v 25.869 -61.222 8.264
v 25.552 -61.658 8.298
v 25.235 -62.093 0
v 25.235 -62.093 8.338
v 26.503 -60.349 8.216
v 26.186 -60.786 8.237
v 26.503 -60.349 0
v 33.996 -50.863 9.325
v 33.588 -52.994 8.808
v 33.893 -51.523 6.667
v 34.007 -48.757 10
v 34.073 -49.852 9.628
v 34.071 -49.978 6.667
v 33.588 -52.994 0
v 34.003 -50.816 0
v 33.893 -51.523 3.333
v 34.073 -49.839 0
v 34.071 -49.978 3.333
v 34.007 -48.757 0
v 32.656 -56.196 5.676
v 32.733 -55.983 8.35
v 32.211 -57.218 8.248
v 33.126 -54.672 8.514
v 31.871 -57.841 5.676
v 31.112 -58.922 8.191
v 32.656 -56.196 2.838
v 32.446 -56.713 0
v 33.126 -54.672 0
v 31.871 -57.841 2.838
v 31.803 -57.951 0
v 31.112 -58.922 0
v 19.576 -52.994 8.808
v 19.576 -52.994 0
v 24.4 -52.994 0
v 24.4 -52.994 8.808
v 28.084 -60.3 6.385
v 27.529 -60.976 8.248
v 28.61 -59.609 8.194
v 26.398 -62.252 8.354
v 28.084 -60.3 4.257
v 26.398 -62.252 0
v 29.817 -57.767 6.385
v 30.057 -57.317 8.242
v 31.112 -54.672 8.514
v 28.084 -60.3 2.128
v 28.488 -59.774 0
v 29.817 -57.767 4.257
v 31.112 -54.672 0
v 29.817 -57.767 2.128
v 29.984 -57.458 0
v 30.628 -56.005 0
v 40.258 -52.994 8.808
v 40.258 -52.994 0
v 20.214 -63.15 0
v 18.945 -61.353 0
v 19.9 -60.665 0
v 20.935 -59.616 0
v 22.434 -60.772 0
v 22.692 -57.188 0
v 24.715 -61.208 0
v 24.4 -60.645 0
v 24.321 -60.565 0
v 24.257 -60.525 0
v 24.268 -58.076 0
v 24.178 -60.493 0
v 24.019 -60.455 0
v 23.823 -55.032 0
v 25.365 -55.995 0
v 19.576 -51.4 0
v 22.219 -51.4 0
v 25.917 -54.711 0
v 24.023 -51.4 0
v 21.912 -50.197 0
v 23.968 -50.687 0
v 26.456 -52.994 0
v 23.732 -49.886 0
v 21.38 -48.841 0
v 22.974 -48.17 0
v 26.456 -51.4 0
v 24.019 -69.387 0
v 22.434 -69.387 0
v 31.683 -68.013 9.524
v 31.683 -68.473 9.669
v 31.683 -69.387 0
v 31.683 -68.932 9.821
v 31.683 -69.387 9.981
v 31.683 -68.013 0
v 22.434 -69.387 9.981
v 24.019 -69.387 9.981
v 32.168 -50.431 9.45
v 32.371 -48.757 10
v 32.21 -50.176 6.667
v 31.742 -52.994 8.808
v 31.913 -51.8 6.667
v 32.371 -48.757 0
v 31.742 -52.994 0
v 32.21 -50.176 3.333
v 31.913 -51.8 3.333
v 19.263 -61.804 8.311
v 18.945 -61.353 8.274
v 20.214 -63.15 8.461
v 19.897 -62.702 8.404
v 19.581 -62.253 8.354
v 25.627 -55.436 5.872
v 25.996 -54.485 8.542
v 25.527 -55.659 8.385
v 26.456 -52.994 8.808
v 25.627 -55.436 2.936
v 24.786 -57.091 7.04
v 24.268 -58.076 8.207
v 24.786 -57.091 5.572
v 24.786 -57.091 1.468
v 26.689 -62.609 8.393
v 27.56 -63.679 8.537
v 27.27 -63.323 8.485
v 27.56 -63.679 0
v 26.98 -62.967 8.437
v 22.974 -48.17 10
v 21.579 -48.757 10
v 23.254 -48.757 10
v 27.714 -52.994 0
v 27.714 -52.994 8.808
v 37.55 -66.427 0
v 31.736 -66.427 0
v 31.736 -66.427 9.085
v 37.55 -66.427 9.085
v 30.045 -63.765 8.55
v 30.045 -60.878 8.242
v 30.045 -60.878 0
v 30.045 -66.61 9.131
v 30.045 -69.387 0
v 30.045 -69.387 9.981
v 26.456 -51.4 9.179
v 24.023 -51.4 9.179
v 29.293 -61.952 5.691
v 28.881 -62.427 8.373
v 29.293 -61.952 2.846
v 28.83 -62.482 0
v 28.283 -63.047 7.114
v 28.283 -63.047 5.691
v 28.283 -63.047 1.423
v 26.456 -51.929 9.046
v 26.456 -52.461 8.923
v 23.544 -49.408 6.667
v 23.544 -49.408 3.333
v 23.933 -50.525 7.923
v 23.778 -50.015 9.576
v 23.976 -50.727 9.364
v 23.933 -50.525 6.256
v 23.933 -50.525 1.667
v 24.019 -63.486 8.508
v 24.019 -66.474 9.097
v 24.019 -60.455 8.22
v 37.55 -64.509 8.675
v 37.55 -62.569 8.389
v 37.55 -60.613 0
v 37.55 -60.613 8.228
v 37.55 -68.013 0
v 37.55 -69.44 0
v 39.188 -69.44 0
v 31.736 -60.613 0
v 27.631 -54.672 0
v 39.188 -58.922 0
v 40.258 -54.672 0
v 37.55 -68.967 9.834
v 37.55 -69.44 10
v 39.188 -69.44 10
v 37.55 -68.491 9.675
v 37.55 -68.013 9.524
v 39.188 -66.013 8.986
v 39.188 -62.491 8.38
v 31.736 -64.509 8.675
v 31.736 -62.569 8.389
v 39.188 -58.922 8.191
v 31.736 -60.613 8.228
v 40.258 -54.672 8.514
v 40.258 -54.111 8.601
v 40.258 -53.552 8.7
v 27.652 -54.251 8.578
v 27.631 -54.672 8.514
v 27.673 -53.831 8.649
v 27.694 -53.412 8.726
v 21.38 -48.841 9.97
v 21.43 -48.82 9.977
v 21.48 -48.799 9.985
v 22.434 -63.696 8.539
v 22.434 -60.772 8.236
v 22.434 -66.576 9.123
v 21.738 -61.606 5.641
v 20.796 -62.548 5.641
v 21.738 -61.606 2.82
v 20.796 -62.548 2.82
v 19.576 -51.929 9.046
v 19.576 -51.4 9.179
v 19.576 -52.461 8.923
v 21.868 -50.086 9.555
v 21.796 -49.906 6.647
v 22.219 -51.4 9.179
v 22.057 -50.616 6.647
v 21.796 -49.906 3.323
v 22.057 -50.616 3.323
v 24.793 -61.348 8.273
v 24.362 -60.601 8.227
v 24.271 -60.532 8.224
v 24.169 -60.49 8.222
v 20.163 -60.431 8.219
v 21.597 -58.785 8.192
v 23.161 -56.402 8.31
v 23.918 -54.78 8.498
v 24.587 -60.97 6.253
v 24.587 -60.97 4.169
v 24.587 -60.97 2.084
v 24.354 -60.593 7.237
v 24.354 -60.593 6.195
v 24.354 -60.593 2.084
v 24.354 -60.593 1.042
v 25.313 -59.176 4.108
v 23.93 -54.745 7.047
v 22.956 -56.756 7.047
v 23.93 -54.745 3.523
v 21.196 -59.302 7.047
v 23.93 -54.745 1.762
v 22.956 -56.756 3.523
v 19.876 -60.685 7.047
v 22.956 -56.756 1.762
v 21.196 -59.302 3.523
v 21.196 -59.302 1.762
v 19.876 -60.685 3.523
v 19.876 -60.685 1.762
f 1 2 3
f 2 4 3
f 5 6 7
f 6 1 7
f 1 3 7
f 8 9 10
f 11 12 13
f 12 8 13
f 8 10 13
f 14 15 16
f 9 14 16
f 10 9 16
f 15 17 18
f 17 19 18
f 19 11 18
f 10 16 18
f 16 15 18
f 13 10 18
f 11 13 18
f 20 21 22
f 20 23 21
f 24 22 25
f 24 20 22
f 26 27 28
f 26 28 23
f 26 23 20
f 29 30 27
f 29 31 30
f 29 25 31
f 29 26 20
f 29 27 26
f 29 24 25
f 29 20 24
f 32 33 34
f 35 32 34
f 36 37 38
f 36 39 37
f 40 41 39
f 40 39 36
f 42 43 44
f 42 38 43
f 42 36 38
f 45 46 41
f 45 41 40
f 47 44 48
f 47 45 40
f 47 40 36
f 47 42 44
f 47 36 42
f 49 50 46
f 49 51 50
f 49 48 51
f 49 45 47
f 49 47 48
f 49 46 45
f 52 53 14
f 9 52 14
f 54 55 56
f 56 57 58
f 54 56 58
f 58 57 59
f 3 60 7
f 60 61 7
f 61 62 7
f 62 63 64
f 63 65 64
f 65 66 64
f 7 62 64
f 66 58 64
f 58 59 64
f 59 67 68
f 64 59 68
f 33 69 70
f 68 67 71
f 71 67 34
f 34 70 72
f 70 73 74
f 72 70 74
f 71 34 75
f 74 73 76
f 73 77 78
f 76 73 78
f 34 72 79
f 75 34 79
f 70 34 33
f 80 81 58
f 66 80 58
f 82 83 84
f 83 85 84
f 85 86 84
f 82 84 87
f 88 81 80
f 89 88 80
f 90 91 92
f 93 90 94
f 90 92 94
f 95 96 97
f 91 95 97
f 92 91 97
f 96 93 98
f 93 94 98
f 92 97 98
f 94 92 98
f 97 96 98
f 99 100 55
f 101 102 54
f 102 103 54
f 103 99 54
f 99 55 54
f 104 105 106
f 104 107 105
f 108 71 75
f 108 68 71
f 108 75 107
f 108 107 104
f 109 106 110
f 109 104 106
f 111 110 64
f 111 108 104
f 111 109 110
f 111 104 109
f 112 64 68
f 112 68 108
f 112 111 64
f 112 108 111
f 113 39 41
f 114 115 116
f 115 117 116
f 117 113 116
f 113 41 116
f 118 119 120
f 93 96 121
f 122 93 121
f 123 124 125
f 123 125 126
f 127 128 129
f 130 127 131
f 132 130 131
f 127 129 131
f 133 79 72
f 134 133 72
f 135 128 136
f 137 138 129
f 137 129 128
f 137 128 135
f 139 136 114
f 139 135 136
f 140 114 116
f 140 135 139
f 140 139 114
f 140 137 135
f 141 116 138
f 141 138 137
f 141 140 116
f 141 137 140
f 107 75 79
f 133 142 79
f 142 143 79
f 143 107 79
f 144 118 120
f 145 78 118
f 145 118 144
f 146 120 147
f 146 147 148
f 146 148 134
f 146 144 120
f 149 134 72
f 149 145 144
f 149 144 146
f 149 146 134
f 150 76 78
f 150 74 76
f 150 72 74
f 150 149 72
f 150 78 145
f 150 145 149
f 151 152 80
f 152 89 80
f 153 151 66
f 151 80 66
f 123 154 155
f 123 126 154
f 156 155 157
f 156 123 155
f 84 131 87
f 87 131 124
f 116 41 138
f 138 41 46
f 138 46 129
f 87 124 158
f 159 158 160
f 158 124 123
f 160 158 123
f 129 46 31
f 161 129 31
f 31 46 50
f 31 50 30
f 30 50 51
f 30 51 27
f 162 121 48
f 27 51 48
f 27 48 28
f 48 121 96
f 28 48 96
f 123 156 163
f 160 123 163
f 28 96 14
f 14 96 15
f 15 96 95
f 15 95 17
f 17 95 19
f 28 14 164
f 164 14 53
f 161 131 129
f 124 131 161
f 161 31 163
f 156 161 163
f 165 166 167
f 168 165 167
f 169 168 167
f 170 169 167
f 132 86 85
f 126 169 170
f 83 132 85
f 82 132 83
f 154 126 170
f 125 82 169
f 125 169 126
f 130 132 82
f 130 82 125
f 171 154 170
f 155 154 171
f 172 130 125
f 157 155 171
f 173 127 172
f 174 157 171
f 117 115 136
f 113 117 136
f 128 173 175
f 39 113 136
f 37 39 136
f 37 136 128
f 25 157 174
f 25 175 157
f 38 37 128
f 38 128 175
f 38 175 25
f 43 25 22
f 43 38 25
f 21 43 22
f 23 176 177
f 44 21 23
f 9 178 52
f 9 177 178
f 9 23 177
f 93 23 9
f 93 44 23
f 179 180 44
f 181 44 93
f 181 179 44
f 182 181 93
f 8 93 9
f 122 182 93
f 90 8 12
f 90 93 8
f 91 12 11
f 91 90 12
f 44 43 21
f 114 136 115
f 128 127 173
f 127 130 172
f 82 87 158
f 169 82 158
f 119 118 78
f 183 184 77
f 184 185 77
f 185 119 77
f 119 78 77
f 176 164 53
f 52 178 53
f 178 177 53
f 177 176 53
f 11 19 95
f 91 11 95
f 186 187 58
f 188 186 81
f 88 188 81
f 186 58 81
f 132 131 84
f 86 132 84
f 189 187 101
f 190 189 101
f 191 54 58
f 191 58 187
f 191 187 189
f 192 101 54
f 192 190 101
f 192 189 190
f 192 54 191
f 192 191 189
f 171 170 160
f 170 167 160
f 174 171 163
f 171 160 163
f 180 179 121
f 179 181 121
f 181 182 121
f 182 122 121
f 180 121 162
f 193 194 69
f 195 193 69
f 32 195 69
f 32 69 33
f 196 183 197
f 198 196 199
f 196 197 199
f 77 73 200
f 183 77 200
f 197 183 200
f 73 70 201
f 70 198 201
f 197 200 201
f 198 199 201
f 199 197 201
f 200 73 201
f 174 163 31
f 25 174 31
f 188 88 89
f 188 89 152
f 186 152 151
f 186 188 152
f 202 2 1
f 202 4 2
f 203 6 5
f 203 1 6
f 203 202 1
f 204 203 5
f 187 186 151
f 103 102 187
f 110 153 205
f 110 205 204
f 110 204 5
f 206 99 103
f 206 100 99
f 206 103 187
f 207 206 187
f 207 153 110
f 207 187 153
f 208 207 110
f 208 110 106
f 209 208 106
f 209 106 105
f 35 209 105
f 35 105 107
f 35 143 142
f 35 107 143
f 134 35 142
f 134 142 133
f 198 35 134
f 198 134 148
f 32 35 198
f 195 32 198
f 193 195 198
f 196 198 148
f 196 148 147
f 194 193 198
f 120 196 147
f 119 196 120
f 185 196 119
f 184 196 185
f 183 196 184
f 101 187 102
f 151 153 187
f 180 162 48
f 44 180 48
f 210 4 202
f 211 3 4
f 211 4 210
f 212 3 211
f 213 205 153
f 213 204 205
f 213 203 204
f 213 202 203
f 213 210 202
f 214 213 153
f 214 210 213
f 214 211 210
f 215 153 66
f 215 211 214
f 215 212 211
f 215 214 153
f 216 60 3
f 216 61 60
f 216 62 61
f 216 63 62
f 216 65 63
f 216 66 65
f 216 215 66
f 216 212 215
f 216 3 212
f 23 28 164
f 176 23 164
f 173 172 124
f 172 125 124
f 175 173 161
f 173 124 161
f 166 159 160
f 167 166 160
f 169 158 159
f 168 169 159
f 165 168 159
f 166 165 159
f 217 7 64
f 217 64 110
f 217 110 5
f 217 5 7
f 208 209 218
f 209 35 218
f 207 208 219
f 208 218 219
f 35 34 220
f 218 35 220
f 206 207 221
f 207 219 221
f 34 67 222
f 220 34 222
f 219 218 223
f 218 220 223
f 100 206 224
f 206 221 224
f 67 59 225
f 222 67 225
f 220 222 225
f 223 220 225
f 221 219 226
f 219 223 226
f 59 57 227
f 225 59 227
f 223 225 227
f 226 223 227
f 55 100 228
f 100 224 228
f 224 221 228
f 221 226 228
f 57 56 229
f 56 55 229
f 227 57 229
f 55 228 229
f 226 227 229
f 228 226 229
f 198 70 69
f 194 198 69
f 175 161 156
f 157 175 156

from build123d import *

# Parameters (mm, degrees)
F1_DEPTH = 10
F0_W     = 5.8139264584
F0_H     = 5.8139264584
F3_DEPTH = 200


with BuildPart() as f1:
    # F0 (on Top) → F1 (new body)
    with BuildSketch(Plane.XY):
        with BuildLine():
            Line((22.9741111398, -48.1698401272), (21.3800054044, -48.8410443068))
            add(Edge.make_bspline(
                [(21.3800054044, -48.8410443068), (21.524594907, -49.2160956774), (21.7868467024, -49.8963518062), (22.0824932893, -50.5990640789), (22.1730765622, -51.1305136503), (22.2190096974, -51.4000020921)],
                knots=[0, 0, 0, 0, 0.3772276795, 0.6842034479, 1, 1, 1, 1], degree=3))
            Line((22.2190096974, -51.4000020921), (19.5761490613, -51.4000020921))
            Line((19.5761490613, -51.4000020921), (19.5761490613, -52.9941096902))
            Line((19.5761490613, -52.9941096902), (24.4004167616, -52.9941096902))
            add(Edge.make_bspline(
                [(24.4004167616, -52.9941096902), (24.2679929093, -53.5784359754), (23.98854509, -54.8115122168), (23.0099309061, -56.7937003015), (21.2795782257, -59.3085357977), (19.9512093339, -60.6919749864), (19.2509091372, -61.1524687513), (18.9453065395, -61.3534227014)],
                knots=[0, 0, 0, 0, 0.1908898343, 0.4028258276, 0.6522225297, 0.8482340876, 1, 1, 1, 1], degree=3))
            Line((18.9453065395, -61.3534227014), (20.2137995511, -63.1504505873))
            add(Edge.make_bspline(
                [(22.4336609244, -60.7720278203), (22.2193825413, -61.0447629972), (21.7678373045, -61.6194932534), (20.7947152937, -62.5339951909), (20.391954321, -62.9613965451), (20.2137995511, -63.1504505873)],
                knots=[0, 0, 0, 0, 0.3349448552, 0.7058236663, 1, 1, 1, 1], degree=3))
            Line((22.4336609244, -60.7720278203), (22.4336609244, -69.3872123957))
            Line((22.4336609244, -69.3872123957), (24.0192785859, -69.3872123957))
            Line((24.0192785859, -69.3872123957), (24.0192785859, -60.4549050331))
            add(Edge.make_bspline(
                [(25.2349171788, -62.0933771133), (25.1299231341, -61.9186800346), (24.9155961542, -61.5620665009), (24.5873540863, -60.9917459152), (24.3736706942, -60.5270046564), (24.1299113219, -60.4774128102), (24.0192785859, -60.4549050331)],
                knots=[0, 0, 0, 0, 0.2744106756, 0.5601614031, 0.800374661, 1, 1, 1, 1], degree=3))
            Line((25.2349171788, -62.0933771133), (26.5034101903, -60.3491999209))
            add(Edge.make_bspline(
                [(24.2679929093, -58.0763779581), (24.6090541844, -58.4415971161), (25.3080659698, -59.1901209573), (26.098595302, -59.9566666127), (26.5034101903, -60.3491999209)],
                knots=[0, 0, 0, 0, 0.4879192056, 1, 1, 1, 1], degree=3))
            add(Edge.make_bspline(
                [(26.4559742063, -52.9941096902), (26.2204164278, -53.8074575651), (25.7642118272, -55.3826678796), (24.6031830474, -57.3946817788), (24.3564340323, -57.8965099703), (24.2679929093, -58.0763779581)],
                knots=[0, 0, 0, 0, 0.4065039358, 0.7872759152, 1, 1, 1, 1], degree=3))
            Line((26.4559742063, -52.9941096902), (26.4559742063, -51.4000020921))
            Line((26.4559742063, -51.4000020921), (24.0228660405, -51.4000020921))
            add(Edge.make_bspline(
                [(22.9741111398, -48.1698401272), (23.1677160931, -48.5713815167), (23.5530605276, -49.370595261), (24.0182670501, -50.6466479678), (24.0214963958, -51.1756425361), (24.0228660405, -51.4000020921)],
                knots=[0, 0, 0, 0, 0.367680231, 0.731817695, 1, 1, 1, 1], degree=3))
        make_face()
    extrude(amount=F1_DEPTH)


with BuildPart() as f1b:
    # F0 (on Top) → F1, piece 2 (new body)
    with BuildSketch(Plane.XY):
        with BuildLine():
            Line((31.7416936159, -52.9941096902), (27.7144797146, -52.9941096902))
            Line((27.7144797146, -52.9941096902), (27.6305787265, -54.6721145511))
            Line((27.6305787265, -54.6721145511), (31.1124417931, -54.6721145511))
            add(Edge.make_bspline(
                [(26.3977032155, -62.2519366443), (26.9529510611, -61.6398399962), (28.113947147, -60.3599758448), (29.8765229764, -57.8402958637), (30.6154790091, -56.0805293685), (30.9545730444, -55.119521665), (31.1124417931, -54.6721145511)],
                knots=[0, 0, 0, 0, 0.2702142518, 0.5650047833, 0.7974834606, 1, 1, 1, 1], degree=3))
            Line((26.3977032155, -62.2519366443), (27.5604873896, -63.6789947748))
            add(Edge.make_bspline(
                [(30.0446208566, -60.8777366579), (29.8282077293, -61.218473349), (29.358386486, -61.9581943529), (28.093755143, -63.2617112834), (27.706139733, -63.5650214134), (27.5604873896, -63.6789947748)],
                knots=[0, 0, 0, 0, 0.3477281045, 0.7548989859, 1, 1, 1, 1], degree=3))
            Line((30.0446208566, -60.8777366579), (30.0446208566, -69.3872123957))
            Line((30.0446208566, -69.3872123957), (31.6830910742, -69.3872123957))
            Line((31.6830910742, -69.3872123957), (31.6830910742, -68.0130124092))
            Line((31.6830910742, -68.0130124092), (37.5498719513, -68.0130124092))
            Line((37.5498719513, -68.0130124092), (37.5498719513, -69.4400668144))
            Line((37.5498719513, -69.4400668144), (39.1883403063, -69.4400668144))
            Line((39.1883403063, -69.4400668144), (39.1883403063, -58.9221417904))
            Line((39.1883403063, -58.9221417904), (31.1124417931, -58.9221417904))
            add(Edge.make_bspline(
                [(33.1260487437, -54.6721145511), (32.9899684164, -55.1707391663), (32.7084407151, -56.2023110654), (31.9228094689, -57.8621087911), (31.3677229258, -58.5882113624), (31.1124417931, -58.9221417904)],
                knots=[0, 0, 0, 0, 0.3356903153, 0.6944877678, 1, 1, 1, 1], degree=3))
            Line((33.1260487437, -54.6721145511), (40.2575731277, -54.6721145511))
            Line((40.2575731277, -54.6721145511), (40.2575731277, -52.9941096902))
            Line((40.2575731277, -52.9941096902), (33.587500453, -52.9941096902))
            add(Edge.make_bspline(
                [(33.587500453, -52.9941096902), (33.6951009585, -52.5116532501), (33.9121364598, -51.5385149281), (34.1244981221, -49.9885594753), (34.0445716656, -49.1508939402), (34.0070016682, -48.7571433187)],
                knots=[0, 0, 0, 0, 0.3425634475, 0.6909672891, 1, 1, 1, 1], degree=3))
            Line((34.0070016682, -48.7571433187), (32.3709473014, -48.7571433187))
            add(Edge.make_bspline(
                [(32.3709473014, -48.7571433187), (32.3294307706, -49.2174762774), (32.243288043, -50.1726219968), (31.89417522, -51.7887643764), (31.7898016432, -52.6138226018), (31.7416936159, -52.9941096902)],
                knots=[0, 0, 0, 0, 0.3340056033, 0.6930288528, 1, 1, 1, 1], degree=3))
        make_face()
        with Locations((34.6429087222, -63.5204315186)):
            Rectangle(F0_W, F0_H, mode=Mode.SUBTRACT)
    extrude(amount=F1_DEPTH)


with BuildPart() as f3_tool:
    # F2 (on Right) → F3 (new body)
    with BuildSketch(Plane.YZ):
        with BuildLine():
            Line((-58.9221417904, 10), (-69.4400668144, 10))
            ThreePointArc((-69.4400668144, 10), (-59.0986050665, 8.1901782881), (-48.7571433187, 10))
            add(Edge.make_bspline(
                [(-52.9941096902, 10), (-52.8332908768, 10), (-52.3480926228, 10), (-51.3462425512, 10), (-50.2259894479, 10), (-49.298865578, 10), (-48.8883935258, 10), (-48.7571433187, 10)],
                knots=[0, 0, 0, 0, 0.4824564401, 1.4555947621, 3.0055502149, 3.84321575, 4.2369663715, 4.2369663715, 4.2369663715, 4.2369663715], degree=3))
            Line((-52.9941096902, 10), (-54.6721145511, 10))
            add(Edge.make_bspline(
                [(-54.6721145511, 10), (-54.8383227561, 10), (-55.3483882609, 10), (-56.4117196743, 10), (-57.550877073, 10), (-58.4574873146, 10), (-58.8108316477, 10), (-58.9221417904, 10)],
                knots=[0, 0, 0, 0, 0.4986246152, 1.5301965143, 3.1899942401, 3.9160968113, 4.2500272393, 4.2500272393, 4.2500272393, 4.2500272393], degree=3))
        make_face()
    extrude(amount=F3_DEPTH)


with BuildPart() as f1_1:
    add(f1.part)

    # F3: cut by f3_tool
    add(f3_tool.part, mode=Mode.SUBTRACT)


with BuildPart() as f1b_1:
    add(f1b.part)

    # F3: cut by f3_tool
    add(f3_tool.part, mode=Mode.SUBTRACT)


solid = Compound([f1_1.part, f1b_1.part])
